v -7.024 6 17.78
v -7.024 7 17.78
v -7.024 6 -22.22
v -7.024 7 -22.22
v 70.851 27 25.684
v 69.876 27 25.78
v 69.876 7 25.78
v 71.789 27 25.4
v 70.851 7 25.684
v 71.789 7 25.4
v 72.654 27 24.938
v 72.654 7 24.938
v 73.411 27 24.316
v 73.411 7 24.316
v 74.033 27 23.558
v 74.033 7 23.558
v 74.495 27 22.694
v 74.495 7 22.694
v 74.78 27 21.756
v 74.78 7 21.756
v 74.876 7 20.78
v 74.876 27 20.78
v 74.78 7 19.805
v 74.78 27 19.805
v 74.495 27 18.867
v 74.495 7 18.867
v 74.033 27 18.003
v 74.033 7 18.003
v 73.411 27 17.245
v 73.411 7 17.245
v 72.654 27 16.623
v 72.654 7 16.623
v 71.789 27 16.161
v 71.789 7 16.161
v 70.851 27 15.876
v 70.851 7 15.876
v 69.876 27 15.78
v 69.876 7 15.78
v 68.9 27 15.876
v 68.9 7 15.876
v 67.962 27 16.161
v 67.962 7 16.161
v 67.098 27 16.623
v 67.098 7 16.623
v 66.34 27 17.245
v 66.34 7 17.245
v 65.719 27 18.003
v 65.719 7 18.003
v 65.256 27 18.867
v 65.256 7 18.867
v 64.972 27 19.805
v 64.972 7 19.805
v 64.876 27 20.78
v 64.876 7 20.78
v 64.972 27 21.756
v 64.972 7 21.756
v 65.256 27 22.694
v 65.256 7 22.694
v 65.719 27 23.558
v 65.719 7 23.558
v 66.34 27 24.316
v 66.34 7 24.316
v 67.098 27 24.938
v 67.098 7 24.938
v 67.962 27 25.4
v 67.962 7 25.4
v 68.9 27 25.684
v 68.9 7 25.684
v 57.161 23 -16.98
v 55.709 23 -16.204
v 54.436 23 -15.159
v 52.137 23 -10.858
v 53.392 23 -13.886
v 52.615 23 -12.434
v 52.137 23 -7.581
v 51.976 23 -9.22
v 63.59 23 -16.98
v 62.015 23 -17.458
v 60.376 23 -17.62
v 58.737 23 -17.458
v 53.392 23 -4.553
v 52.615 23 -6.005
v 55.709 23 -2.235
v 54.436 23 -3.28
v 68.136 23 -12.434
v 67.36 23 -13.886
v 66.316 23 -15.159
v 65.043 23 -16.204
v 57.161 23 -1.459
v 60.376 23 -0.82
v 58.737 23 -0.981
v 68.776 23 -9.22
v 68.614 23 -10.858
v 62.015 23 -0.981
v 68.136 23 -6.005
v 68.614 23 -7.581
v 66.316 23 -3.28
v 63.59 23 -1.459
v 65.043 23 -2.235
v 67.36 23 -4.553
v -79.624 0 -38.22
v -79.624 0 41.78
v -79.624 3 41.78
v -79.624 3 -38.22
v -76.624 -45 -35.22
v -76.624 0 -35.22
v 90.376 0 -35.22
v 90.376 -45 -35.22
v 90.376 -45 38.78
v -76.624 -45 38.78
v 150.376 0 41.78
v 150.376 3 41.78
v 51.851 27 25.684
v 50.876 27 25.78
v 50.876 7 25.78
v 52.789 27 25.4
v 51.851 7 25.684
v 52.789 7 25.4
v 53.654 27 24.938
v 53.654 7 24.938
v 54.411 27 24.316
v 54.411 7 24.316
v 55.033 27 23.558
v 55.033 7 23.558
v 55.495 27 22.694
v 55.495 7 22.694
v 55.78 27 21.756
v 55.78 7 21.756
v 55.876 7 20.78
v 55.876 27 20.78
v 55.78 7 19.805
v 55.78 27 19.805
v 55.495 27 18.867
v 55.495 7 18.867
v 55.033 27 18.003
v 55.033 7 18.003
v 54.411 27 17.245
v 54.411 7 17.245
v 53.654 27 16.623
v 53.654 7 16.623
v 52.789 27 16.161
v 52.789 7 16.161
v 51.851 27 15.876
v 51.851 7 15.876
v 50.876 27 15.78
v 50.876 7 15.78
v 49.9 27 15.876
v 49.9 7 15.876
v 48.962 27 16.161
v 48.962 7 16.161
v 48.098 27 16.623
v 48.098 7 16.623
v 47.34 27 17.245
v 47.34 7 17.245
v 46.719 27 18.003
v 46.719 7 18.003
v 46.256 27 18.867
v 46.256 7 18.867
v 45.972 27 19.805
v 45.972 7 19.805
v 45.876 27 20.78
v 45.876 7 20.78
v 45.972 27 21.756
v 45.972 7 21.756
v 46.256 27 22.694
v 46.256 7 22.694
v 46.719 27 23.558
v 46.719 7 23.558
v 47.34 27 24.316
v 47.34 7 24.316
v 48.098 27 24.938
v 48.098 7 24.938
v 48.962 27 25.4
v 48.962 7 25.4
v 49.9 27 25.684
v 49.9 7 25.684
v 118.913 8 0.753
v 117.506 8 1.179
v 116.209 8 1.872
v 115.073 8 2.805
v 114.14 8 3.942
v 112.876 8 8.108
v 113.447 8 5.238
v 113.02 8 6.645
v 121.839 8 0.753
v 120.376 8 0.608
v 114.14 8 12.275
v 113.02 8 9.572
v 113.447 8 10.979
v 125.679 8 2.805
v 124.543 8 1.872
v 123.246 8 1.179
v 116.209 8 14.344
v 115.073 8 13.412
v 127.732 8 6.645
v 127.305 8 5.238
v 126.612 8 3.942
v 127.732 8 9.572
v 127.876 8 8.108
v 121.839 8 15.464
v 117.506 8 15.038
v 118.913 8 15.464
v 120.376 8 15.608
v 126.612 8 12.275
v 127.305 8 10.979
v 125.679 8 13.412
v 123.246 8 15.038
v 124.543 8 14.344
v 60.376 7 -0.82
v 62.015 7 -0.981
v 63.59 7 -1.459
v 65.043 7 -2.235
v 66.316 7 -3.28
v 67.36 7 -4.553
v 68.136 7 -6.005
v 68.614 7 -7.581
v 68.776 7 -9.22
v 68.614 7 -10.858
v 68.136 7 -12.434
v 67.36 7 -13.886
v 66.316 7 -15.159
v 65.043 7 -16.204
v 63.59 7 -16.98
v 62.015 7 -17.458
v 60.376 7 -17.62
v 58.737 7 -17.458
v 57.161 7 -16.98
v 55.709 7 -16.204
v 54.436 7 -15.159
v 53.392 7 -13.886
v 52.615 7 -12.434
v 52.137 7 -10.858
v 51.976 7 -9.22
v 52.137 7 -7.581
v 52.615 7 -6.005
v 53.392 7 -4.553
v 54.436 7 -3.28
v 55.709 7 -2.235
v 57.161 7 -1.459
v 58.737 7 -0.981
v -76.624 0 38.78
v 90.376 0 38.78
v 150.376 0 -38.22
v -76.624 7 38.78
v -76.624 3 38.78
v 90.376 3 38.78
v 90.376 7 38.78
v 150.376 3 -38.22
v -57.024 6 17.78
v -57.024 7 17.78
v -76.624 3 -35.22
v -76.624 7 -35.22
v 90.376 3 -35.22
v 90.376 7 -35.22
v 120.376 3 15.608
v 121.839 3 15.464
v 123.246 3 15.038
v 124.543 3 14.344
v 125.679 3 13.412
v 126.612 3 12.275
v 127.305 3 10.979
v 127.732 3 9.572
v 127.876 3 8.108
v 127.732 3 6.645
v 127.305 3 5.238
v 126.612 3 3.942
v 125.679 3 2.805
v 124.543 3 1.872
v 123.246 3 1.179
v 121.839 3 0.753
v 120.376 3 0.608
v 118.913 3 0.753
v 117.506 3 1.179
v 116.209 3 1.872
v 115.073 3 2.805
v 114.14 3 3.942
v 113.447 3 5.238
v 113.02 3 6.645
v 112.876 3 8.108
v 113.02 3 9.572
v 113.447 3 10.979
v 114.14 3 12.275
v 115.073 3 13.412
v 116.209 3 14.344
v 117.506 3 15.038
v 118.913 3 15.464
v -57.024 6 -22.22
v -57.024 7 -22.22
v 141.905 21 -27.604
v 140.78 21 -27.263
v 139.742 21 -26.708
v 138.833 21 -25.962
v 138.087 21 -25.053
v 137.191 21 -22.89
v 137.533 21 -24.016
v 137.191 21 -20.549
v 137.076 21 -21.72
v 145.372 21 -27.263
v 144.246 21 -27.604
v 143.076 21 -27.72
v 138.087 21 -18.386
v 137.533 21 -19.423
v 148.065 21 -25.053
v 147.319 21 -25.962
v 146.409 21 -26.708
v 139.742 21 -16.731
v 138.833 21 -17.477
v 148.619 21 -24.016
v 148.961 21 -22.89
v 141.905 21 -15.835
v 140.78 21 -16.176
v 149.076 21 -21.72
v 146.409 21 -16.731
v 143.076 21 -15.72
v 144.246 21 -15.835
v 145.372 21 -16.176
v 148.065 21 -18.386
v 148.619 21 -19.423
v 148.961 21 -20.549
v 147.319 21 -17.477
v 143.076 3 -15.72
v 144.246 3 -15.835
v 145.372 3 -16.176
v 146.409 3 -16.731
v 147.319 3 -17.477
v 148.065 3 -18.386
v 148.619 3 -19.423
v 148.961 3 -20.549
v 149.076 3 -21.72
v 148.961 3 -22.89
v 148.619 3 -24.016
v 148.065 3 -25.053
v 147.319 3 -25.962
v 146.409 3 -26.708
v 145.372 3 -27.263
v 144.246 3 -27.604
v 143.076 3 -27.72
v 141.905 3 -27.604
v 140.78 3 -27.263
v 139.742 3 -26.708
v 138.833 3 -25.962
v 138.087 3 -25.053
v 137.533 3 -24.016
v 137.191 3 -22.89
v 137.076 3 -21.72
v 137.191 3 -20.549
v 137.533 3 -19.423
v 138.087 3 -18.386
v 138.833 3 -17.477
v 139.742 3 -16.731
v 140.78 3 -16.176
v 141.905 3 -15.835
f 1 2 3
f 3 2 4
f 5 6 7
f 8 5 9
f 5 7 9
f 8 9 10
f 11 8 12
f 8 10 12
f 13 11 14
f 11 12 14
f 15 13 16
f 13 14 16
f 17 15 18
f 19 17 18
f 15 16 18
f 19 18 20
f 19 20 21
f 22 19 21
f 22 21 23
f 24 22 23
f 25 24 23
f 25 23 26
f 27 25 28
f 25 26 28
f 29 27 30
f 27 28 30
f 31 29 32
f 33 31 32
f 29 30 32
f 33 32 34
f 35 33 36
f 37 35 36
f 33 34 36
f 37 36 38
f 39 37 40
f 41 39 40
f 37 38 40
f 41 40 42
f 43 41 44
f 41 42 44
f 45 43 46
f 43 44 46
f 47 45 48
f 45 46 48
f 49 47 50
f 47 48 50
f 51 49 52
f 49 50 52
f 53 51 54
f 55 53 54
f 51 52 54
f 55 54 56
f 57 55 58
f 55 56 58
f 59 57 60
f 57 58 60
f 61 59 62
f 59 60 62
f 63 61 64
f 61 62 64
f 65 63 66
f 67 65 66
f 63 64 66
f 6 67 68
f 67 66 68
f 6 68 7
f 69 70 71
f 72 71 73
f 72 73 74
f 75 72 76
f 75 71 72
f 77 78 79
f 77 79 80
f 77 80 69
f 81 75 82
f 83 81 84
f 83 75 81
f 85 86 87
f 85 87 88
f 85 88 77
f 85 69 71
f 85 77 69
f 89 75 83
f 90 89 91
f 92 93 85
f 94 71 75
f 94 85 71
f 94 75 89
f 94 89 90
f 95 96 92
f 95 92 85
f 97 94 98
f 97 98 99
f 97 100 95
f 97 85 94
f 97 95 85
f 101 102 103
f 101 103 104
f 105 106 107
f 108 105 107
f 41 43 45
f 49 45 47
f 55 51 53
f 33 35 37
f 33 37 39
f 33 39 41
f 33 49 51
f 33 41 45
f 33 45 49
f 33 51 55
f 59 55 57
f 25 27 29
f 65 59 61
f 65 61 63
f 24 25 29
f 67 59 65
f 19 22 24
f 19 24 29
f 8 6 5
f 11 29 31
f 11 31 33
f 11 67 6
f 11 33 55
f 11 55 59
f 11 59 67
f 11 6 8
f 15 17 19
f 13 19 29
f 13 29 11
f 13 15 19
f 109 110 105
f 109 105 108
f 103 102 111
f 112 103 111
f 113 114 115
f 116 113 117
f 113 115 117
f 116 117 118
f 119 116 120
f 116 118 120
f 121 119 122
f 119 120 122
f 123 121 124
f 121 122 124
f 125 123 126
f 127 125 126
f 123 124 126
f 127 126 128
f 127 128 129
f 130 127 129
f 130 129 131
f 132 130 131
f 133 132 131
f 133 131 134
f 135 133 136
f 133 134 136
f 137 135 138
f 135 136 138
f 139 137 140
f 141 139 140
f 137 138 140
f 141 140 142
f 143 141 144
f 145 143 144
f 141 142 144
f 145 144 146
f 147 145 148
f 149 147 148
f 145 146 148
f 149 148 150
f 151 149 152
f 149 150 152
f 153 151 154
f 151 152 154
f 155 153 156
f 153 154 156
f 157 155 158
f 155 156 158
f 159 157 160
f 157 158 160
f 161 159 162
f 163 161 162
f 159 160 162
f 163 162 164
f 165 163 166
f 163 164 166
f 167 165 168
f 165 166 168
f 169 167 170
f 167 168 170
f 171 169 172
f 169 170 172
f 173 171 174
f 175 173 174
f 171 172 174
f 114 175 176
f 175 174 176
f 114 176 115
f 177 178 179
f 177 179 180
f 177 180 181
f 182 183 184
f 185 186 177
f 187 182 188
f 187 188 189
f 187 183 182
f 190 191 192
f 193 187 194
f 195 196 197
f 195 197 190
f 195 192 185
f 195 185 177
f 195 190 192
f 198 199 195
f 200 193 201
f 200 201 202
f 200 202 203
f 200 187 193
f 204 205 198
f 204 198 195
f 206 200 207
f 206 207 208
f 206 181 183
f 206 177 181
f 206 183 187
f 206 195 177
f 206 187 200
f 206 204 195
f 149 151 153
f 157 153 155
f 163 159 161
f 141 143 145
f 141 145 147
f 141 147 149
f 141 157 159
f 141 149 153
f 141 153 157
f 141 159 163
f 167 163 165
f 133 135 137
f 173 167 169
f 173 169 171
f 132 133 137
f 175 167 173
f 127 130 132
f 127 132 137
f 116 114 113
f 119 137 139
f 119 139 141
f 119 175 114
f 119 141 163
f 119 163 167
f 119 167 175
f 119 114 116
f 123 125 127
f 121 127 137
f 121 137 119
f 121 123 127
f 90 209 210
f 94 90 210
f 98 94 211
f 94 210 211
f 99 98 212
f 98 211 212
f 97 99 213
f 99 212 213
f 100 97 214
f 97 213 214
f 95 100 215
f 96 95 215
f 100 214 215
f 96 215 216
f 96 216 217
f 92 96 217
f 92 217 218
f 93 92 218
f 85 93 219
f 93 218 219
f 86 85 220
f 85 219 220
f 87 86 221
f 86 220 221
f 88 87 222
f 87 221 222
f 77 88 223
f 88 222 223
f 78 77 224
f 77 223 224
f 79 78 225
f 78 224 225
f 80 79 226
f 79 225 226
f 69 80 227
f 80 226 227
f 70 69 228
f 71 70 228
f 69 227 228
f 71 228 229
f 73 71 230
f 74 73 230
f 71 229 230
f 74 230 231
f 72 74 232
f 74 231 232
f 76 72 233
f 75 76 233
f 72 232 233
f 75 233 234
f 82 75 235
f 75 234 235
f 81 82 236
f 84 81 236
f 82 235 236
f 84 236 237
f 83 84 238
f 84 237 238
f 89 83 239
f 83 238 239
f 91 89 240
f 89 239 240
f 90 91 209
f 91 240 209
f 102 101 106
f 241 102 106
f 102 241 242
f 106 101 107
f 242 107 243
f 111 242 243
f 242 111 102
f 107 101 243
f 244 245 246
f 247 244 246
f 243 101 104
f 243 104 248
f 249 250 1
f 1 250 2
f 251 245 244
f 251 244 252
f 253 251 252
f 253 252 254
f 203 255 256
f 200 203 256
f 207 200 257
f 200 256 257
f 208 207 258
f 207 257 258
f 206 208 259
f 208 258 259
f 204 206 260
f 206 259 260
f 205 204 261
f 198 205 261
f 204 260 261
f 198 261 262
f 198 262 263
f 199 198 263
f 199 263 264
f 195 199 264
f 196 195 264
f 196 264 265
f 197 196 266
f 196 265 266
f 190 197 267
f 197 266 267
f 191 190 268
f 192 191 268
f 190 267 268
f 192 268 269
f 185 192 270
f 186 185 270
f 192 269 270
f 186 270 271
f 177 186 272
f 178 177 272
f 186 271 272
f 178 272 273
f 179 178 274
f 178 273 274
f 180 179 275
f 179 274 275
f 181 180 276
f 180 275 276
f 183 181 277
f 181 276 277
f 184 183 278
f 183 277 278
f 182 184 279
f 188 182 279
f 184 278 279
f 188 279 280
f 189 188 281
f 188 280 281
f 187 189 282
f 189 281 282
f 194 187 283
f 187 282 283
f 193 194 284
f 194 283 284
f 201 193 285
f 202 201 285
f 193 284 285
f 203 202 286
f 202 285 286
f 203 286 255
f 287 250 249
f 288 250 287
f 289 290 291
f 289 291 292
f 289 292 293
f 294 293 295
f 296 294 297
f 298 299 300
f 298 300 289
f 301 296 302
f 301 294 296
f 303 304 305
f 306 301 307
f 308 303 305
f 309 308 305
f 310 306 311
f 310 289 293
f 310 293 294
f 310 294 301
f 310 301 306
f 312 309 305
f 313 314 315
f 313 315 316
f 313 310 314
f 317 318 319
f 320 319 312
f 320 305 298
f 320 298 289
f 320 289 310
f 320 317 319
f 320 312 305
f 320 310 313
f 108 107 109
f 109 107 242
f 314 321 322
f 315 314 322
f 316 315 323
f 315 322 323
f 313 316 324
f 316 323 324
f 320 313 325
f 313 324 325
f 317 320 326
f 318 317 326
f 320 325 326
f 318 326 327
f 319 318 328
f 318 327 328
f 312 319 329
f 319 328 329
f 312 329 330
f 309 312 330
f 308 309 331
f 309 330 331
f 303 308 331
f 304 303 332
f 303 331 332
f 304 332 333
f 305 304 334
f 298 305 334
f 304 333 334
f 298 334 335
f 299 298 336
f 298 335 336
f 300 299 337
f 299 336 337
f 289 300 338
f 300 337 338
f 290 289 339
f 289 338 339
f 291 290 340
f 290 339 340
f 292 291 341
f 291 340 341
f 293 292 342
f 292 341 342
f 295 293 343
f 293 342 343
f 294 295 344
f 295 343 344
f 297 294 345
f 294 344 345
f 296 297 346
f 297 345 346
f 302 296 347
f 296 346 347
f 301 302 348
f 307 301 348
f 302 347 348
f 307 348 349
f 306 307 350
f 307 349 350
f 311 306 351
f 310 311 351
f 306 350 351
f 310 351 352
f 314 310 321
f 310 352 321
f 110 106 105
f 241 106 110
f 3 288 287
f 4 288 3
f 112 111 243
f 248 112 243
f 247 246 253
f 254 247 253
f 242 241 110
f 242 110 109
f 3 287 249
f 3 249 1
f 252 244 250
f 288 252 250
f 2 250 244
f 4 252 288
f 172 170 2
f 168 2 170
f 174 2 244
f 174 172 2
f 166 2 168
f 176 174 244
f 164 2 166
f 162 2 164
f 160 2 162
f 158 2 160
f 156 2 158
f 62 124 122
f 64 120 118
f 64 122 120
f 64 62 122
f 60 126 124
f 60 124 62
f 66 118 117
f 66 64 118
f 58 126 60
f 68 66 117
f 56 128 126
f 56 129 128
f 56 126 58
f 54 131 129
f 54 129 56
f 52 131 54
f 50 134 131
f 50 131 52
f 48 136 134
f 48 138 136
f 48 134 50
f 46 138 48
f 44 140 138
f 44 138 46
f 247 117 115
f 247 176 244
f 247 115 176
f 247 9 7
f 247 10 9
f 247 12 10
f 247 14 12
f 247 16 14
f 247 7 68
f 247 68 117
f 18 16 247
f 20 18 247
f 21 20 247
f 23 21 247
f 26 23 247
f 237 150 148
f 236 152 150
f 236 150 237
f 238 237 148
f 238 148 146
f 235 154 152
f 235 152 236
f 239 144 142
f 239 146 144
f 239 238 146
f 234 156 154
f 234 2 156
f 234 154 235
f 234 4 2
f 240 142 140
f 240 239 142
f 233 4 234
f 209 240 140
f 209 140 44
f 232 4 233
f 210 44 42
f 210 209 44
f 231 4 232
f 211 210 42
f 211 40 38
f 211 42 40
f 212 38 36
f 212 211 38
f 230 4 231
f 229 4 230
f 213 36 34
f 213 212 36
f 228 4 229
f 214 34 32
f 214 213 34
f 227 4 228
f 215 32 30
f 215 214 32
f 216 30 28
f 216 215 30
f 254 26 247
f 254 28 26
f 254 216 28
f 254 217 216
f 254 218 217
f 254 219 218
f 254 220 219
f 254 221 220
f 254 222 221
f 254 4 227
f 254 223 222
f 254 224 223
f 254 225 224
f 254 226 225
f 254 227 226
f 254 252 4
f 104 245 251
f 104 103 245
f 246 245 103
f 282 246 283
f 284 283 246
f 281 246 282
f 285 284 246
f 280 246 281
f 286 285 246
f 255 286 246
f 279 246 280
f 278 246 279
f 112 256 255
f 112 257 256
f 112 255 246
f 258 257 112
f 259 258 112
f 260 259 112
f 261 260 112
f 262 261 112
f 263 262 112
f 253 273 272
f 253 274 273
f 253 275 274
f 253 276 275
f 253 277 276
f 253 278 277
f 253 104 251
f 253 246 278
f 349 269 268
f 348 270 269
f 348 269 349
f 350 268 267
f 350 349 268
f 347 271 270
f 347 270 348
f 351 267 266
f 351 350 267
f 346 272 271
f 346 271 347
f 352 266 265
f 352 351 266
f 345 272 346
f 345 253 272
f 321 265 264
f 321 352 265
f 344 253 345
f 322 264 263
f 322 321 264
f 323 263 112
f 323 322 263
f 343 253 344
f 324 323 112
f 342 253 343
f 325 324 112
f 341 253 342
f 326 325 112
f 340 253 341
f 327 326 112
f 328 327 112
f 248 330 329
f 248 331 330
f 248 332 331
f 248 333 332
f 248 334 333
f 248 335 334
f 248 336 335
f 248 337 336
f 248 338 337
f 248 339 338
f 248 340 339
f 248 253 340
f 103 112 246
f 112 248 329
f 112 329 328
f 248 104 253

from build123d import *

# Parameters (mm, degrees)
SKETCH_1_W          = 230
SKETCH_1_H          = 80
EXTRUDE_1_DEPTH     = 3
SKETCH_2_W          = 167
SKETCH_2_H          = 74
EXTRUDE_2_DEPTH     = 4
SKETCH_3_W          = 50
SKETCH_3_H          = 40
CUT_EXTRUDE_1_DEPTH = 1
SKETCH_4_R          = 8.4
EXTRUDE_3_DEPTH     = 16
SKETCH_5_R          = 5
EXTRUDE_4_DEPTH     = 20
SKETCH_6_R          = 6
EXTRUDE_5_DEPTH     = 18
SKETCH_7_R          = 7.5
EXTRUDE_6_DEPTH     = 5
SKETCH_8_W          = 167
SKETCH_8_H          = 74
EXTRUDE_7_DEPTH     = 45


with BuildPart() as part:
    # 草图1 → 凸台-拉伸1 (new body)
    with BuildSketch(Plane(origin=(0, 0, 0), x_dir=(1, 0, 0), z_dir=(0, 1, 0))):
        with Locations((35.37586548, -1.78041543)):
            Rectangle(SKETCH_1_W, SKETCH_1_H)
    extrude(amount=EXTRUDE_1_DEPTH)

    # 草图2 → 凸台-拉伸2 (add)
    with BuildSketch(Plane(origin=(0, 3, 0), x_dir=(1, 0, 0), z_dir=(0, 1, 0))):
        with Locations((6.87586548, -1.78041543)):
            Rectangle(SKETCH_2_W, SKETCH_2_H)
    extrude(amount=EXTRUDE_2_DEPTH)

    # 草图3 → 切除-拉伸1 (cut)
    with BuildSketch(Plane(origin=(0, 7, 0), x_dir=(1, 0, 0), z_dir=(0, 1, 0))):
        with Locations((-32.02413452, 2.21958457)):
            Rectangle(SKETCH_3_W, SKETCH_3_H)
    extrude(amount=-CUT_EXTRUDE_1_DEPTH, mode=Mode.SUBTRACT)

    # 草图4 → 凸台-拉伸3 (add)
    with BuildSketch(Plane(origin=(0, 7, 0), x_dir=(1, 0, 0), z_dir=(0, 1, 0))):
        with Locations(Location((60.37586548, 9.21958457, 0), (0, 0, 270))):
            Circle(SKETCH_4_R)
    extrude(amount=EXTRUDE_3_DEPTH)

    # 草图5 → 凸台-拉伸4 (add)
    with BuildSketch(Plane(origin=(0, 7, 0), x_dir=(1, 0, 0), z_dir=(0, 1, 0))):
        with Locations(Location((50.87586548, -20.78041543, 0), (0, 0, 270))):
            Circle(SKETCH_5_R)
        with Locations(Location((69.87586548, -20.78041543, 0), (0, 0, 270))):
            Circle(SKETCH_5_R)
    extrude(amount=EXTRUDE_4_DEPTH)

    # 草图6 → 凸台-拉伸5 (add)
    with BuildSketch(Plane(origin=(0, 3, 0), x_dir=(1, 0, 0), z_dir=(0, 1, 0))):
        with Locations(Location((143.07586548, 21.71958457, 0), (0, 0, 270))):
            Circle(SKETCH_6_R)
    extrude(amount=EXTRUDE_5_DEPTH)

    # 草图7 → 凸台-拉伸6 (add)
    with BuildSketch(Plane(origin=(0, 3, 0), x_dir=(1, 0, 0), z_dir=(0, 1, 0))):
        with Locations(Location((120.37586548, -8.108420441, 0), (0, 0, 270))):
            Circle(SKETCH_7_R)
    extrude(amount=EXTRUDE_6_DEPTH)

    # 草图8 → 凸台-拉伸7 (add)
    with BuildSketch(Plane.XZ):
        with Locations((6.87586548, 1.78041543)):
            Rectangle(SKETCH_8_W, SKETCH_8_H)
    extrude(amount=EXTRUDE_7_DEPTH)


solid = part.part
